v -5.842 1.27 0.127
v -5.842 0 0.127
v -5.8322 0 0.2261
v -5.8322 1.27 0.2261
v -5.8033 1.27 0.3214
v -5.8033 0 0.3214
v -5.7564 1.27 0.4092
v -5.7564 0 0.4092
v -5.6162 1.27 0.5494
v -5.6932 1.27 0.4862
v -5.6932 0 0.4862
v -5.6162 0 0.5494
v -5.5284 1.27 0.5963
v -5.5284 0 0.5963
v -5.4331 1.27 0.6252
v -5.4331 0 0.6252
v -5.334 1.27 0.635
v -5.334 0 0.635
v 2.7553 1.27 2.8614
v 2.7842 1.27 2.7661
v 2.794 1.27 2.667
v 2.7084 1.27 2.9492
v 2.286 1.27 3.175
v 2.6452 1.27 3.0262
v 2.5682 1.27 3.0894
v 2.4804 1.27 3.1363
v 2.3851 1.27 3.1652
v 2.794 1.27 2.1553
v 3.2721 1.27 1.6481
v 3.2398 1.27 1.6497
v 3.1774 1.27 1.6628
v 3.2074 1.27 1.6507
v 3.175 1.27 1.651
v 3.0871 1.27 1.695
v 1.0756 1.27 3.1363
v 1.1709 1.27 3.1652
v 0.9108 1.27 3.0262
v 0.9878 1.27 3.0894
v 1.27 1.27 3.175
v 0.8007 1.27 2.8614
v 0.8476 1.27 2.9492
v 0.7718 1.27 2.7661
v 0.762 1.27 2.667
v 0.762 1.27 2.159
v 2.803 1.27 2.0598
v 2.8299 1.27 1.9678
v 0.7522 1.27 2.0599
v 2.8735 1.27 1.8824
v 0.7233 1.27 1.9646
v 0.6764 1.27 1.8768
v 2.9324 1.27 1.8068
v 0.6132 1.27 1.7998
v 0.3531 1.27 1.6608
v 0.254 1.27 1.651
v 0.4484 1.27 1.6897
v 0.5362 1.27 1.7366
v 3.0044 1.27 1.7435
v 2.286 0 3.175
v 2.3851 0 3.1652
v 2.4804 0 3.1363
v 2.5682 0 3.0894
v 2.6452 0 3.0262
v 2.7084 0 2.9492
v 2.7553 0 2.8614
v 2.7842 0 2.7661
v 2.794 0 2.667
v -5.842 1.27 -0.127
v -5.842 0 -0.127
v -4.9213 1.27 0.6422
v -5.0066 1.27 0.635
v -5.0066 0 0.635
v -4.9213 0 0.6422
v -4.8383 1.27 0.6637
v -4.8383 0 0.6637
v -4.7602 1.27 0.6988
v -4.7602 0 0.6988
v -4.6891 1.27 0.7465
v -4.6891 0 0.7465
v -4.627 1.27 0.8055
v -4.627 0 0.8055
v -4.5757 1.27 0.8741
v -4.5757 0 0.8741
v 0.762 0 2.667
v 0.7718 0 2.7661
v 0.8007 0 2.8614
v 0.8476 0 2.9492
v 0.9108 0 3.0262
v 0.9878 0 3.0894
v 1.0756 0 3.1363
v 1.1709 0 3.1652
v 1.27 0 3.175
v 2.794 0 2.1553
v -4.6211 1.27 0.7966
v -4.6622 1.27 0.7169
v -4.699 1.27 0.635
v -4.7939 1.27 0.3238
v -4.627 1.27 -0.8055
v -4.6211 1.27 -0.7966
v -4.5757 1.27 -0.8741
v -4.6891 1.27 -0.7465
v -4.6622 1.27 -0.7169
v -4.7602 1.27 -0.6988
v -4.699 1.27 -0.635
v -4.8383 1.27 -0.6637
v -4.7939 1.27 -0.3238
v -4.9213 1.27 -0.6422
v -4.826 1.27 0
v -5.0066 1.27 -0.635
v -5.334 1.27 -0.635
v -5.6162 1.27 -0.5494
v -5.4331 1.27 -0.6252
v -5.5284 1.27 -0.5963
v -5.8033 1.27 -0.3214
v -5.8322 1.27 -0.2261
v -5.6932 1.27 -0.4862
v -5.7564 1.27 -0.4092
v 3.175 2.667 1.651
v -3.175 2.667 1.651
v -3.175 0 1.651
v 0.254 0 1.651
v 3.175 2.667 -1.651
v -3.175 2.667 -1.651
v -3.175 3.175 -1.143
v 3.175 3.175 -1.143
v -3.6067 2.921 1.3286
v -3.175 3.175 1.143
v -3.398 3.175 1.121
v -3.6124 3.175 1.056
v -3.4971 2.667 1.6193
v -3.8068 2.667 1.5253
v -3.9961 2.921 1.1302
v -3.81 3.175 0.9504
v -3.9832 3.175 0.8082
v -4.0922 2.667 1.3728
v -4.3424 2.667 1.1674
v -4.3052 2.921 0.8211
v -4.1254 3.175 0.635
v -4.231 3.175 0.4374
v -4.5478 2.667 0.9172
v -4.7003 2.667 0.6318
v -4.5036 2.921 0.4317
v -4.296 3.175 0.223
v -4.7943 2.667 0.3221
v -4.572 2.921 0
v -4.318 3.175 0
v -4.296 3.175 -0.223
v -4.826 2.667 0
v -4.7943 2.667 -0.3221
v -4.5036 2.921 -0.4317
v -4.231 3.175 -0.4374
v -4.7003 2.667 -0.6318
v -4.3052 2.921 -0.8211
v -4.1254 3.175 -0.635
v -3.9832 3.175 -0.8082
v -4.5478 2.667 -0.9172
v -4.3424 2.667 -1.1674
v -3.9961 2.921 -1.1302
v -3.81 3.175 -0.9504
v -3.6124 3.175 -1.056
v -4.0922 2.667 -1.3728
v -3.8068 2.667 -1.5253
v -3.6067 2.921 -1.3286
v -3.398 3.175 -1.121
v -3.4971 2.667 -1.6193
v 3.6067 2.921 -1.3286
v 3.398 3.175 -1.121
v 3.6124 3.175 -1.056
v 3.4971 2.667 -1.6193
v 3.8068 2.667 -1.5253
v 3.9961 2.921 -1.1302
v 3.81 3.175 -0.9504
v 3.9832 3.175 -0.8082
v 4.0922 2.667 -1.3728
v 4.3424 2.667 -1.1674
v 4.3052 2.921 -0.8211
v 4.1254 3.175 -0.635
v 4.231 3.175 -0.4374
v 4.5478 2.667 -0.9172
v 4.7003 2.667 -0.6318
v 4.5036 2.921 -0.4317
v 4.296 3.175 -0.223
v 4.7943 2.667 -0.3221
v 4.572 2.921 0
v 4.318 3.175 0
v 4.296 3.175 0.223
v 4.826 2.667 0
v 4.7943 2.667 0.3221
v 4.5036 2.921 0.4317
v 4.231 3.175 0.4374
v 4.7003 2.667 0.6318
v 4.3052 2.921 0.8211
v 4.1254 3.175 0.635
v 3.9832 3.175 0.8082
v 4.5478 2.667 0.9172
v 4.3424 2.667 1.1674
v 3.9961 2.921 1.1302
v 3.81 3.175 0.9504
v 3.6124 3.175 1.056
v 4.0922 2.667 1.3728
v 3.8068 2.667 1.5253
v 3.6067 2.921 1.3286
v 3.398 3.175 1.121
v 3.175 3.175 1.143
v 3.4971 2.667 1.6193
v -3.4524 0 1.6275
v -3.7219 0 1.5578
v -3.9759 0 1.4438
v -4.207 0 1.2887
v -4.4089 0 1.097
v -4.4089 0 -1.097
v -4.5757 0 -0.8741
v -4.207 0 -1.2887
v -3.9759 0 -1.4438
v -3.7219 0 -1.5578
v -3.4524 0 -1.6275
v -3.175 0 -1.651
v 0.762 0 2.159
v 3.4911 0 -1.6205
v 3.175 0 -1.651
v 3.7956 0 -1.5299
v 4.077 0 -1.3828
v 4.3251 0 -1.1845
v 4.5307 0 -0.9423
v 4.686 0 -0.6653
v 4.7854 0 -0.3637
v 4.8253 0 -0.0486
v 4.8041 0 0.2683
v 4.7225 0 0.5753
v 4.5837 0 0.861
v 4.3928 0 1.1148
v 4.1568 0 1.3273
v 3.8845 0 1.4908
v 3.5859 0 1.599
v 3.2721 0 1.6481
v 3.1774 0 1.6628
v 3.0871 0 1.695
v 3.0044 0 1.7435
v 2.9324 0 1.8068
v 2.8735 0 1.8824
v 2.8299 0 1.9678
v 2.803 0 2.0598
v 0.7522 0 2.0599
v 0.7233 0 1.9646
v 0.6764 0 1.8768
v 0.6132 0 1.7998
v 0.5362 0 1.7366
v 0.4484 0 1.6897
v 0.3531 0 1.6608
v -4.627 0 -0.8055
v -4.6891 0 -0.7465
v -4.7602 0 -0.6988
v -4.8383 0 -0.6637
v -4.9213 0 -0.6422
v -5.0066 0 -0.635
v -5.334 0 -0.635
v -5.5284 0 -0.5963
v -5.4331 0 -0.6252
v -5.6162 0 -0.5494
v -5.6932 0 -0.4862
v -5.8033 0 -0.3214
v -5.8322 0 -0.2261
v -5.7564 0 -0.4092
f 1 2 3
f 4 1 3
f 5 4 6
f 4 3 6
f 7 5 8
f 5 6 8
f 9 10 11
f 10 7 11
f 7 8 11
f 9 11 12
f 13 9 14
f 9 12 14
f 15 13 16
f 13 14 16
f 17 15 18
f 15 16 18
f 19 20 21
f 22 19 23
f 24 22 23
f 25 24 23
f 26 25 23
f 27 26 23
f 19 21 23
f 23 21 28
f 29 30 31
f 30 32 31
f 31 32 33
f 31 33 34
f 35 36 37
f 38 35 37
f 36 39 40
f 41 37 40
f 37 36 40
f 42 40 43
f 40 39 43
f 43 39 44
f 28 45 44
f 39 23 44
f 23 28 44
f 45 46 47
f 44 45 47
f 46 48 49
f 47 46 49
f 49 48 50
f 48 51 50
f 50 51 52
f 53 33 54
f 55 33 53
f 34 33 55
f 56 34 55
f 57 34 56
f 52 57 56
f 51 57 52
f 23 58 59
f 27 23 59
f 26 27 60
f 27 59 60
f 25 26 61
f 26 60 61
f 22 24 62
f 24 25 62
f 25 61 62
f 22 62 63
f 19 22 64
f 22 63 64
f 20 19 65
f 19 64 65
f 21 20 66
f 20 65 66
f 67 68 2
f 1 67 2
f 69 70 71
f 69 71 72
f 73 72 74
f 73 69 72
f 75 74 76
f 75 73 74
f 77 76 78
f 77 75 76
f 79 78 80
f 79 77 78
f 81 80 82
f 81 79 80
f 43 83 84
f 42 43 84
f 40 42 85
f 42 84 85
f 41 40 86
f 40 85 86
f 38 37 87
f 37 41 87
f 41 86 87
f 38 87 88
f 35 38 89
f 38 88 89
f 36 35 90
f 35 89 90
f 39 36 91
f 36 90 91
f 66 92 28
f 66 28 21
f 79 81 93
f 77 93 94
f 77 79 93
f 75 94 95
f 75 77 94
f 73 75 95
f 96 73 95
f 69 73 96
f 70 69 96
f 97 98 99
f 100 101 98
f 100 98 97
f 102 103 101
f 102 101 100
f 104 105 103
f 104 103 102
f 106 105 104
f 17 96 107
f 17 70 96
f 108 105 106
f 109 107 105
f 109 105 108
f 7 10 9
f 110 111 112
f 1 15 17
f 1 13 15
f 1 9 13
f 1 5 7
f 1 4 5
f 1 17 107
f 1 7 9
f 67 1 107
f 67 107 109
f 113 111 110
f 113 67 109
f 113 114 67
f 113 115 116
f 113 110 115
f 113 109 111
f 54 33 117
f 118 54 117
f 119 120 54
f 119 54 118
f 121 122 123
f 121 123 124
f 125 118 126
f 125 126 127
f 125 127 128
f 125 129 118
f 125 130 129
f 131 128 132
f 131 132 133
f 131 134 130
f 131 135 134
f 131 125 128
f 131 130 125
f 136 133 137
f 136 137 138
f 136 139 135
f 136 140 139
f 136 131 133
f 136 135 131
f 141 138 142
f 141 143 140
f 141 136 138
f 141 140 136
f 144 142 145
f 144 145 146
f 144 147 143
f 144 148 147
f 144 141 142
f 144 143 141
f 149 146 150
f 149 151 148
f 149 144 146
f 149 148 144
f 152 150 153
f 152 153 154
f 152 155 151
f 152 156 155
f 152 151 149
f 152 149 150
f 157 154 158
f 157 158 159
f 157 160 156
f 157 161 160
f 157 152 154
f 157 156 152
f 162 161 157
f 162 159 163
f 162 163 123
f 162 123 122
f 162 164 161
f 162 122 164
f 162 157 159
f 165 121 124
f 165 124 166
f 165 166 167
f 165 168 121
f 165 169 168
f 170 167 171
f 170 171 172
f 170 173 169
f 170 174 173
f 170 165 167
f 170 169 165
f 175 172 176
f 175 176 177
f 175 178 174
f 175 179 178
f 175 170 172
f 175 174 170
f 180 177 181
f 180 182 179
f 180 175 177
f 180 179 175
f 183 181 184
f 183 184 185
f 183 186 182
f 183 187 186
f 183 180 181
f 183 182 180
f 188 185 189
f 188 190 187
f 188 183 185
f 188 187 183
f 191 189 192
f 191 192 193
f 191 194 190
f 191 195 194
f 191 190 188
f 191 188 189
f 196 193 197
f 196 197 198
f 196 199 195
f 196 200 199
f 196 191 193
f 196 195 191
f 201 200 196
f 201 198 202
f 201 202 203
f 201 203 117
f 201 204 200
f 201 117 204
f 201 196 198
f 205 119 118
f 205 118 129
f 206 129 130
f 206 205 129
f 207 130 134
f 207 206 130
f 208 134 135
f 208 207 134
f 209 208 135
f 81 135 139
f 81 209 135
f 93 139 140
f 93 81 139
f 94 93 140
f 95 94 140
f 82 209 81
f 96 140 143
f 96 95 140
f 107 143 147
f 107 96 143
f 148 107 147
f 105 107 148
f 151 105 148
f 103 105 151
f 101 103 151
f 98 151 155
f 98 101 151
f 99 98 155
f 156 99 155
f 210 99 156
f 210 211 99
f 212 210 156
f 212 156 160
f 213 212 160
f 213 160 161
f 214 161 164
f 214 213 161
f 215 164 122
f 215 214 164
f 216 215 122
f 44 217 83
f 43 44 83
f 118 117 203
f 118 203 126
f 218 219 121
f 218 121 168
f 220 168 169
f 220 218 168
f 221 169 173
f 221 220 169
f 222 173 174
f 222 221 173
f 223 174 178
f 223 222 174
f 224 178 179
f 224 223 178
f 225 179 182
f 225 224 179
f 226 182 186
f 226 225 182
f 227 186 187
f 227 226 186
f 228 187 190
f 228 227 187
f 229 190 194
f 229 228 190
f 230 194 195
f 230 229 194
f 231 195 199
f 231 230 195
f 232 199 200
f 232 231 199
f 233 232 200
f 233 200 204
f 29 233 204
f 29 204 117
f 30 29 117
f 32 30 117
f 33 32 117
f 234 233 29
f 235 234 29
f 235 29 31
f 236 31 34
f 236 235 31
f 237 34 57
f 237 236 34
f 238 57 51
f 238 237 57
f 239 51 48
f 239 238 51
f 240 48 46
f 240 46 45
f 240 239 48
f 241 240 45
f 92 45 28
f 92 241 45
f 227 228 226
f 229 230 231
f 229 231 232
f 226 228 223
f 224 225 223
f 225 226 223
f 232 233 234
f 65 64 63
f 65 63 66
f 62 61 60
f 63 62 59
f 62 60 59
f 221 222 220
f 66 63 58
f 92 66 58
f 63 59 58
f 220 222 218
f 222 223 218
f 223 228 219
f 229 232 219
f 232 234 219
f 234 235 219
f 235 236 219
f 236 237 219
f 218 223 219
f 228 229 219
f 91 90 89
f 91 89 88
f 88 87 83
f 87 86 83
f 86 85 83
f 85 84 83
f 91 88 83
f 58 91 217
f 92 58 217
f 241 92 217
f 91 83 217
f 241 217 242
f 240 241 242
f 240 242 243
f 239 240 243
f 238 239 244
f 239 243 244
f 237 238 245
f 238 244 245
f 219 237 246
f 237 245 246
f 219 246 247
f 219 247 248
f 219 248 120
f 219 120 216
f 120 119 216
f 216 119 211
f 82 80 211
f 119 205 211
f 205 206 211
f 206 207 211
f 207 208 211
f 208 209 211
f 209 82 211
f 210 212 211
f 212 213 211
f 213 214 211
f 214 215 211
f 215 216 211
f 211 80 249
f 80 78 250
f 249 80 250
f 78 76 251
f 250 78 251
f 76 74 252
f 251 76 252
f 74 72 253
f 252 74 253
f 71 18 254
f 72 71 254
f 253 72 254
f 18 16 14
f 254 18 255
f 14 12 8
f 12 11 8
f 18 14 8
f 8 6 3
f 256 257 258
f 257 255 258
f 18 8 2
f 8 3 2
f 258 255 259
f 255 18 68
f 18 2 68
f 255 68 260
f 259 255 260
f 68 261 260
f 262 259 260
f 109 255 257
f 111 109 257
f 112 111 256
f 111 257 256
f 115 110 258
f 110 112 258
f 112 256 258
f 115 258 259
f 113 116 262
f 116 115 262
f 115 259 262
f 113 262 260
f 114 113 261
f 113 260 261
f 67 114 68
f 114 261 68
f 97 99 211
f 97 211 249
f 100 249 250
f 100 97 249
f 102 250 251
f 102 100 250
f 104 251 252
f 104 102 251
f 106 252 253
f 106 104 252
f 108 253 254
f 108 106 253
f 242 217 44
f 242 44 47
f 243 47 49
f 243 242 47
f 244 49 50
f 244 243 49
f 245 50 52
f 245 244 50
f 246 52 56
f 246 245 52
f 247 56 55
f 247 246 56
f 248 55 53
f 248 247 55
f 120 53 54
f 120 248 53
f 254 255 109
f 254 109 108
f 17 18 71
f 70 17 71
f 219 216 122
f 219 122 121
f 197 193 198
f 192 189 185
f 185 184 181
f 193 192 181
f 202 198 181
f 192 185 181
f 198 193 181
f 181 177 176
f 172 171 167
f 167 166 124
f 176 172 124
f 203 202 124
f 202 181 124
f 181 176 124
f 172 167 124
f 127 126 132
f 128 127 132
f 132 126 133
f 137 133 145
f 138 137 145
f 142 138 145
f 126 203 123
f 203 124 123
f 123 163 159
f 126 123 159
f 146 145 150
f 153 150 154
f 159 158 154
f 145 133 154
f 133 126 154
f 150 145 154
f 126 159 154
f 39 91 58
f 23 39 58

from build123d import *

# Parameters (mm, degrees)
BOSS_EXTRUDE1_DEPTH = 3.175
SKETCH2_W           = 2.032
SKETCH2_H           = 1.524
SKETCH2_H_2         = 1.27
BOSS_EXTRUDE2_DEPTH = 1.27
CHAMFER1_SIZE       = 0.508
FILLET1_R           = 0.508


with BuildPart() as part:
    # Sketch1 → Boss-Extrude1 (new body)
    with BuildSketch(Plane(origin=(0, 0, 0), x_dir=(1, 0, 0), z_dir=(0, 1, 0))):
        with BuildLine():
            Line((-3.175, 1.651), (3.175, 1.651))
            ThreePointArc((3.175, 1.651), (4.826, 0), (3.175, -1.651))
            Line((3.175, -1.651), (-3.175, -1.651))
            ThreePointArc((-3.175, -1.651), (-4.826, 0), (-3.175, 1.651))
        make_face()
    extrude(amount=BOSS_EXTRUDE1_DEPTH)

    # Sketch2 → Boss-Extrude2 (add)
    with BuildSketch(Plane.XZ):
        with Locations((1.778, 2.413)):
            Rectangle(SKETCH2_W, SKETCH2_H)
        with Locations((-4.826, 0)):
            Rectangle(SKETCH2_W, SKETCH2_H_2)
    extrude(amount=-BOSS_EXTRUDE2_DEPTH)

    # Chamfer1
    chamfer1_edges = [part.edges().sort_by_distance(p)[0] for p in [
        (4.826, 3.175, 0),
        (0, 3.175, -1.651),
        (-4.826, 3.175, 0),
        (0, 3.175, 1.651),
    ]]
    chamfer(chamfer1_edges, length=CHAMFER1_SIZE)

    # Fillet1
    # the kernel refuses this fillet: 0.508 mm, written as the material it adds along each edge
    with BuildSketch(Plane(origin=(0.762, 0, 1.651), x_dir=(-1, 0, 0), z_dir=(0, 1, 0))) as fillet1_piece_1:
        with BuildLine():
            CenterArc((FILLET1_R, FILLET1_R), FILLET1_R, 180, 90)
            Line((0, FILLET1_R), (0, 0))
            Line((0, 0), (FILLET1_R, 0))
        make_face()
    extrude(amount=1.27)
    with BuildSketch(Plane(origin=(2.794, 0, 1.651), x_dir=(0.999982123617744, 0, -0.005979334824793291), z_dir=(0, 1, 0))) as fillet1_piece_2:
        with BuildLine():
            CenterArc((0.504975771, -0.507289957), FILLET1_R, 93.029693992, 86.627713317)
            Line((-0.003015148, -0.504252455), (-0.05381424, -0.503948704))
            Line((-0.05381424, -0.503948704), (-0.050799092, 0.00030375))
            Line((-0.050799092, 0.00030375), (0.00030375, 0.050799092))
            ThreePointArc((0.00030375, 0.050799092), (0.381296939, 0.048520965), (0.475441237, 0.050728996))
            Line((0.475441237, 0.050728996), (0.478126194, 0))
        make_face()
    extrude(amount=1.27)
    with BuildSketch(Plane(origin=(-4.699, 1.27, -0.635), x_dir=(0.45853775751047177, 0, -0.8886749264704544), z_dir=(0, -1, 0))) as fillet1_piece_3:
        with BuildLine():
            CenterArc((0.310391456, -0.506311404), FILLET1_R, 94.672926901, 58.034281249)
            Line((-0.141055407, -0.273374223), (0, 0))
            ThreePointArc((0, 0), (0.134502964, -0.005487936), (0.269005928, 0))
        make_face()
    extrude(amount=1.27)
    with BuildSketch(Plane(origin=(-4.699, 1.27, 0.635), x_dir=(0.45853775751047327, 0, 0.8886749264704539), z_dir=(0, -1, 0))) as fillet1_piece_4:
        with BuildLine():
            CenterArc((0.310391456, 0.506311404), FILLET1_R, 207.292791849, 58.034281249)
            Line((-0.141055407, 0.273374223), (0, 0))
            ThreePointArc((0, 0), (0.134502964, 0.005487936), (0.269005928, 0))
        make_face()
    extrude(amount=1.27)
    # the kernel refuses this fillet: 0.508 mm, written as the material it takes off along each edge
    with BuildSketch(Plane(origin=(0.762, -1.27, 3.175), x_dir=(0, 0, -1), z_dir=(0, 1, 0)), Plane(origin=(2.794, -1.27, 3.175), x_dir=(-1, 0, 0), z_dir=(0, 1, 0)), Plane(origin=(-5.842, -1.27, 0.635), x_dir=(0, 0, -1), z_dir=(0, 1, 0))) as fillet1_2_piece_1:
        with BuildLine():
            CenterArc((FILLET1_R, -FILLET1_R), FILLET1_R, 90, 90)
            Line((0, -FILLET1_R), (0, 0))
            Line((0, 0), (FILLET1_R, 0))
        make_face()
    extrude(amount=3.81, mode=Mode.SUBTRACT)
    with BuildSketch(Plane(origin=(-5.842, -1.27, -0.635), x_dir=(0, 0, 1), z_dir=(0, 1, 0))) as fillet1_2_piece_2:
        with BuildLine():
            CenterArc((FILLET1_R, FILLET1_R), FILLET1_R, 180, 90)
            Line((0, FILLET1_R), (0, 0))
            Line((0, 0), (FILLET1_R, 0))
        make_face()
    extrude(amount=3.81, mode=Mode.SUBTRACT)


solid = part.part
